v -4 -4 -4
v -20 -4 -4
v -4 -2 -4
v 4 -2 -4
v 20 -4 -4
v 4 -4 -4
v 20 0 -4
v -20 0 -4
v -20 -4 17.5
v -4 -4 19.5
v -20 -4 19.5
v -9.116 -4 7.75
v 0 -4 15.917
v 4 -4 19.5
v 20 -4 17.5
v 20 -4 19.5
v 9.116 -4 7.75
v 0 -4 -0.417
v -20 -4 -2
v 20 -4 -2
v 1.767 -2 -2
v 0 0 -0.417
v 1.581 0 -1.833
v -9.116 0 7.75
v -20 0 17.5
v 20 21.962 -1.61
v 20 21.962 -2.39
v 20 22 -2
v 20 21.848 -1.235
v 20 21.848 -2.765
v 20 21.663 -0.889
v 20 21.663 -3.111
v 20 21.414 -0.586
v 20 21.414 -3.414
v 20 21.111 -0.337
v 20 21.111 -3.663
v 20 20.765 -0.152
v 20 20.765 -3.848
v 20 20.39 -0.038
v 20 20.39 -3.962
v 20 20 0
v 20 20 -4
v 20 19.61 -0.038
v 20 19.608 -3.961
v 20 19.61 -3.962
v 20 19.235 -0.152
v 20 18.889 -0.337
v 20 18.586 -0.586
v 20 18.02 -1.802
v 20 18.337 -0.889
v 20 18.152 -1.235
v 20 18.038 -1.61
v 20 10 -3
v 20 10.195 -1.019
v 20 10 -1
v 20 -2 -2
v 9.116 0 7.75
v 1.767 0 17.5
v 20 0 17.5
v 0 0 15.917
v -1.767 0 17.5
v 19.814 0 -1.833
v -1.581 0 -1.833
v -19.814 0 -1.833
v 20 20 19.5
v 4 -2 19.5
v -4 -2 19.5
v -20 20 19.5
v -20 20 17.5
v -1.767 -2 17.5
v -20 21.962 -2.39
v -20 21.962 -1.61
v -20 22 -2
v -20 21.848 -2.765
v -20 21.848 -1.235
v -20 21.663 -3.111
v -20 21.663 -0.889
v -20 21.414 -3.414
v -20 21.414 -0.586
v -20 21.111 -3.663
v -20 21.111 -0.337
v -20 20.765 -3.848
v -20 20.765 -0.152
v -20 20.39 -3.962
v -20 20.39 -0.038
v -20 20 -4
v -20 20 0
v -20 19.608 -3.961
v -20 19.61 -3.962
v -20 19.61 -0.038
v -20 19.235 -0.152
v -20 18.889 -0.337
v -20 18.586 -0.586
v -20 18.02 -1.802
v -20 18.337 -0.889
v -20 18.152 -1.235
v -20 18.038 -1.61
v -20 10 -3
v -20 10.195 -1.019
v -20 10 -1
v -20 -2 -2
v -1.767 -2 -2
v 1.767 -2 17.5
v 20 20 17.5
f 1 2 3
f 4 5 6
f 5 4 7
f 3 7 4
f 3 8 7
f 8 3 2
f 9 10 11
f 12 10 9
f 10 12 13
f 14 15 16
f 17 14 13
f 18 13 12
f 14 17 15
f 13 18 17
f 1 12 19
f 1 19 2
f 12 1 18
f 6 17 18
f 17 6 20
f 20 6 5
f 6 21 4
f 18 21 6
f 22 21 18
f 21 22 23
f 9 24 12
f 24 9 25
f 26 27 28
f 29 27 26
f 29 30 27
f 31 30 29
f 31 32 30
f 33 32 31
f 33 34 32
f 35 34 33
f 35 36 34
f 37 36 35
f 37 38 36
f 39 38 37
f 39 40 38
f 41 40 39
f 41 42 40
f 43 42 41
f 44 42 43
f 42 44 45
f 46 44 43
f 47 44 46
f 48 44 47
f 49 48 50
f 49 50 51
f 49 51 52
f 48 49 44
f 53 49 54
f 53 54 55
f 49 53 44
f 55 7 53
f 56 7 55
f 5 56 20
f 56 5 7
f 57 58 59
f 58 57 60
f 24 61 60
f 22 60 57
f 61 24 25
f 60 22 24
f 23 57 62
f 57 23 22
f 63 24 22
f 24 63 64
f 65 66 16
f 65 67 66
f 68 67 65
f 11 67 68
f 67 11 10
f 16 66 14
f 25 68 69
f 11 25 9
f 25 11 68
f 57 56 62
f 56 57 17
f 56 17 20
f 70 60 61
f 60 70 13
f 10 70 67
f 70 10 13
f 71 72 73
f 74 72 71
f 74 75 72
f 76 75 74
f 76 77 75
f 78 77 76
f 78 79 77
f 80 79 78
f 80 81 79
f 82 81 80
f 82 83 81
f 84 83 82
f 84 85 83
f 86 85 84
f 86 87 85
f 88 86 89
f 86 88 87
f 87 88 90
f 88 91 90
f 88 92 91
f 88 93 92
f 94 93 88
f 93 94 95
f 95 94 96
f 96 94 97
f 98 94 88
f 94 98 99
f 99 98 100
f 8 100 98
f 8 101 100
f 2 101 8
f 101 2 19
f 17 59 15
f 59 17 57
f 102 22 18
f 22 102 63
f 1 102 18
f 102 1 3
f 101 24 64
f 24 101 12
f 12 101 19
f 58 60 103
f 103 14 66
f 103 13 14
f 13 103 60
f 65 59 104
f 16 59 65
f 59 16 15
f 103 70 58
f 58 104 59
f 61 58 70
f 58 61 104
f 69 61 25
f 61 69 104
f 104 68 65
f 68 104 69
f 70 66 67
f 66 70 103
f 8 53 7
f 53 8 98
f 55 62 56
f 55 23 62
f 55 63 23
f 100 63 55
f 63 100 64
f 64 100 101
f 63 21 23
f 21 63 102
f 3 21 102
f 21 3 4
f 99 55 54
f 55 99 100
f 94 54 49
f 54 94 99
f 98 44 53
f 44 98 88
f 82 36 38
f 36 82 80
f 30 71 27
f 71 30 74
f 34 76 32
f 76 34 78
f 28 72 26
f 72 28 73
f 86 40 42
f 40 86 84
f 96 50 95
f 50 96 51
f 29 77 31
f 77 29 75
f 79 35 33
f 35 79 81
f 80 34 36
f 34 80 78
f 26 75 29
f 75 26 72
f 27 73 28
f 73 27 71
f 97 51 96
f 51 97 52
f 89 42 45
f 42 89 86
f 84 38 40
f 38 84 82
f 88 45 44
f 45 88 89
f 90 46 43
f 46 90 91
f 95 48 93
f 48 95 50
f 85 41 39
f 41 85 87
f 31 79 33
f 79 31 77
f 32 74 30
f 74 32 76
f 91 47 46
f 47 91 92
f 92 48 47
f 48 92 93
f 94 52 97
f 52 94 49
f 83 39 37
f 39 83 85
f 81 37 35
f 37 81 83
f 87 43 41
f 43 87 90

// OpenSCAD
//###############################################################################
//# Shelf Sign                                                                  #
//###############################################################################
//#    Copyright 2024 Dirk Heisswolf                                            #
//#    This file is part of the ShelfSign project.                              #
//#                                                                             #
//#    This project is free software: you can redistribute it and/or modify     #
//#    it under the terms of the GNU General Public License as published by     #
//#    the Free Software Foundation, either version 3 of the License, or        #
//#    (at your option) any later version.                                      #
//#                                                                             #
//#    This project is distributed in the hope that it will be useful,          #
//#    but WITHOUT ANY WARRANTY; without even the implied warranty of           #
//#    MERCHANTABILITY or FITNESS FOR A PARTICULAR PURPOSE.  See the            #
//#    GNU General Public License for more details.                             #
//#                                                                             #
//#    You should have received a copy of the GNU General Public License        #
//#    along with this project.  If not, see <http://www.gnu.org/licenses/>.    #
//#                                                                             #
//###############################################################################
//# Description:                                                                #
//#   A headphone hook                                                          #
//#                                                                             #
//###############################################################################
//# Version History:                                                            #
//#   December 9, 2024                                                          #
//#      - Initial release                                                      #
//#                                                                             #
//###############################################################################

//! This is a tray foe essential oil bottles. It is designed to fit inside a box
//! Din A4 footprint. The tray is divided into four pieces to fit on a standard 
//! 3D printer bed.

shelfT  = 17.5; // Thickness of the shelf
springO =  2;   // Room for the Spring
clampW  = 40;   // Width 0f the clamp
clampD  = 20;   // Depth 0f the clamp
clampT  =  2;   // Thickness 0f the clamp
$fn=32;

module shelf() {
    color("white")
    translate([-200,0,0]) cube([400,200,shelfT]);
}
*shelf();

module clamp() {
    translate([-clampW/2,-clampT,shelfT]) cube([clampW,clampD+clampT,clampT]);
    *translate([-clampW/2,-clampT,-clampT-springO]) cube([clampW,clampT,shelfT+2*clampT+springO]);
    
    hull() {
        translate([-clampW/2,-clampT,-clampT-springO]) cube([clampW,clampT,clampT]);
        translate([-clampW/2,clampD/2,-(clampT+springO)/2]) rotate([0,90,0]) cylinder(h=clampW, d=clampT);
    }

    hull() {
        translate([-clampW/2,clampD/2,-(clampT+springO)/2]) rotate([0,90,0]) cylinder(h=clampW, d=clampT);
        translate([-clampW/2,clampD,-clampT/2-springO]) rotate([0,90,0]) cylinder(h=clampW, d=clampT);
    }

    translate([-clampW/2,clampD,-(clampT+springO)/2]) rotate([0,90,0]) cylinder(h=clampW, d=clampT+springO);
}
*clamp();

module arrow() {
    translate([-clampW/2,0,shelfT+clampT])
    rotate([90,0,0])
    linear_extrude(2*clampT)
    polygon([[0,0],
             [clampW,0],
             [clampW,-shelfT-2*clampT-springO], 
             [clampW/2,1.5*(-shelfT-2*clampT-springO)],
             [0,-shelfT-2*clampT-springO]]);
    clamp();
}
*arrow();

module cross() {
    for (m = [0,1]) 
    mirror([m,0,0])
    translate([-clampW/2,0,shelfT+clampT])
    rotate([90,0,0])
    linear_extrude(2*clampT)
    polygon([[0,0],
             [0.4*clampW,0],
             [    clampW,-shelfT-clampT-springO],
             [    clampW,-shelfT-2*clampT-springO],
             [0.6*clampW,-shelfT-2*clampT-springO],
             [0,-clampT]]);
    clamp();
}
cross();
